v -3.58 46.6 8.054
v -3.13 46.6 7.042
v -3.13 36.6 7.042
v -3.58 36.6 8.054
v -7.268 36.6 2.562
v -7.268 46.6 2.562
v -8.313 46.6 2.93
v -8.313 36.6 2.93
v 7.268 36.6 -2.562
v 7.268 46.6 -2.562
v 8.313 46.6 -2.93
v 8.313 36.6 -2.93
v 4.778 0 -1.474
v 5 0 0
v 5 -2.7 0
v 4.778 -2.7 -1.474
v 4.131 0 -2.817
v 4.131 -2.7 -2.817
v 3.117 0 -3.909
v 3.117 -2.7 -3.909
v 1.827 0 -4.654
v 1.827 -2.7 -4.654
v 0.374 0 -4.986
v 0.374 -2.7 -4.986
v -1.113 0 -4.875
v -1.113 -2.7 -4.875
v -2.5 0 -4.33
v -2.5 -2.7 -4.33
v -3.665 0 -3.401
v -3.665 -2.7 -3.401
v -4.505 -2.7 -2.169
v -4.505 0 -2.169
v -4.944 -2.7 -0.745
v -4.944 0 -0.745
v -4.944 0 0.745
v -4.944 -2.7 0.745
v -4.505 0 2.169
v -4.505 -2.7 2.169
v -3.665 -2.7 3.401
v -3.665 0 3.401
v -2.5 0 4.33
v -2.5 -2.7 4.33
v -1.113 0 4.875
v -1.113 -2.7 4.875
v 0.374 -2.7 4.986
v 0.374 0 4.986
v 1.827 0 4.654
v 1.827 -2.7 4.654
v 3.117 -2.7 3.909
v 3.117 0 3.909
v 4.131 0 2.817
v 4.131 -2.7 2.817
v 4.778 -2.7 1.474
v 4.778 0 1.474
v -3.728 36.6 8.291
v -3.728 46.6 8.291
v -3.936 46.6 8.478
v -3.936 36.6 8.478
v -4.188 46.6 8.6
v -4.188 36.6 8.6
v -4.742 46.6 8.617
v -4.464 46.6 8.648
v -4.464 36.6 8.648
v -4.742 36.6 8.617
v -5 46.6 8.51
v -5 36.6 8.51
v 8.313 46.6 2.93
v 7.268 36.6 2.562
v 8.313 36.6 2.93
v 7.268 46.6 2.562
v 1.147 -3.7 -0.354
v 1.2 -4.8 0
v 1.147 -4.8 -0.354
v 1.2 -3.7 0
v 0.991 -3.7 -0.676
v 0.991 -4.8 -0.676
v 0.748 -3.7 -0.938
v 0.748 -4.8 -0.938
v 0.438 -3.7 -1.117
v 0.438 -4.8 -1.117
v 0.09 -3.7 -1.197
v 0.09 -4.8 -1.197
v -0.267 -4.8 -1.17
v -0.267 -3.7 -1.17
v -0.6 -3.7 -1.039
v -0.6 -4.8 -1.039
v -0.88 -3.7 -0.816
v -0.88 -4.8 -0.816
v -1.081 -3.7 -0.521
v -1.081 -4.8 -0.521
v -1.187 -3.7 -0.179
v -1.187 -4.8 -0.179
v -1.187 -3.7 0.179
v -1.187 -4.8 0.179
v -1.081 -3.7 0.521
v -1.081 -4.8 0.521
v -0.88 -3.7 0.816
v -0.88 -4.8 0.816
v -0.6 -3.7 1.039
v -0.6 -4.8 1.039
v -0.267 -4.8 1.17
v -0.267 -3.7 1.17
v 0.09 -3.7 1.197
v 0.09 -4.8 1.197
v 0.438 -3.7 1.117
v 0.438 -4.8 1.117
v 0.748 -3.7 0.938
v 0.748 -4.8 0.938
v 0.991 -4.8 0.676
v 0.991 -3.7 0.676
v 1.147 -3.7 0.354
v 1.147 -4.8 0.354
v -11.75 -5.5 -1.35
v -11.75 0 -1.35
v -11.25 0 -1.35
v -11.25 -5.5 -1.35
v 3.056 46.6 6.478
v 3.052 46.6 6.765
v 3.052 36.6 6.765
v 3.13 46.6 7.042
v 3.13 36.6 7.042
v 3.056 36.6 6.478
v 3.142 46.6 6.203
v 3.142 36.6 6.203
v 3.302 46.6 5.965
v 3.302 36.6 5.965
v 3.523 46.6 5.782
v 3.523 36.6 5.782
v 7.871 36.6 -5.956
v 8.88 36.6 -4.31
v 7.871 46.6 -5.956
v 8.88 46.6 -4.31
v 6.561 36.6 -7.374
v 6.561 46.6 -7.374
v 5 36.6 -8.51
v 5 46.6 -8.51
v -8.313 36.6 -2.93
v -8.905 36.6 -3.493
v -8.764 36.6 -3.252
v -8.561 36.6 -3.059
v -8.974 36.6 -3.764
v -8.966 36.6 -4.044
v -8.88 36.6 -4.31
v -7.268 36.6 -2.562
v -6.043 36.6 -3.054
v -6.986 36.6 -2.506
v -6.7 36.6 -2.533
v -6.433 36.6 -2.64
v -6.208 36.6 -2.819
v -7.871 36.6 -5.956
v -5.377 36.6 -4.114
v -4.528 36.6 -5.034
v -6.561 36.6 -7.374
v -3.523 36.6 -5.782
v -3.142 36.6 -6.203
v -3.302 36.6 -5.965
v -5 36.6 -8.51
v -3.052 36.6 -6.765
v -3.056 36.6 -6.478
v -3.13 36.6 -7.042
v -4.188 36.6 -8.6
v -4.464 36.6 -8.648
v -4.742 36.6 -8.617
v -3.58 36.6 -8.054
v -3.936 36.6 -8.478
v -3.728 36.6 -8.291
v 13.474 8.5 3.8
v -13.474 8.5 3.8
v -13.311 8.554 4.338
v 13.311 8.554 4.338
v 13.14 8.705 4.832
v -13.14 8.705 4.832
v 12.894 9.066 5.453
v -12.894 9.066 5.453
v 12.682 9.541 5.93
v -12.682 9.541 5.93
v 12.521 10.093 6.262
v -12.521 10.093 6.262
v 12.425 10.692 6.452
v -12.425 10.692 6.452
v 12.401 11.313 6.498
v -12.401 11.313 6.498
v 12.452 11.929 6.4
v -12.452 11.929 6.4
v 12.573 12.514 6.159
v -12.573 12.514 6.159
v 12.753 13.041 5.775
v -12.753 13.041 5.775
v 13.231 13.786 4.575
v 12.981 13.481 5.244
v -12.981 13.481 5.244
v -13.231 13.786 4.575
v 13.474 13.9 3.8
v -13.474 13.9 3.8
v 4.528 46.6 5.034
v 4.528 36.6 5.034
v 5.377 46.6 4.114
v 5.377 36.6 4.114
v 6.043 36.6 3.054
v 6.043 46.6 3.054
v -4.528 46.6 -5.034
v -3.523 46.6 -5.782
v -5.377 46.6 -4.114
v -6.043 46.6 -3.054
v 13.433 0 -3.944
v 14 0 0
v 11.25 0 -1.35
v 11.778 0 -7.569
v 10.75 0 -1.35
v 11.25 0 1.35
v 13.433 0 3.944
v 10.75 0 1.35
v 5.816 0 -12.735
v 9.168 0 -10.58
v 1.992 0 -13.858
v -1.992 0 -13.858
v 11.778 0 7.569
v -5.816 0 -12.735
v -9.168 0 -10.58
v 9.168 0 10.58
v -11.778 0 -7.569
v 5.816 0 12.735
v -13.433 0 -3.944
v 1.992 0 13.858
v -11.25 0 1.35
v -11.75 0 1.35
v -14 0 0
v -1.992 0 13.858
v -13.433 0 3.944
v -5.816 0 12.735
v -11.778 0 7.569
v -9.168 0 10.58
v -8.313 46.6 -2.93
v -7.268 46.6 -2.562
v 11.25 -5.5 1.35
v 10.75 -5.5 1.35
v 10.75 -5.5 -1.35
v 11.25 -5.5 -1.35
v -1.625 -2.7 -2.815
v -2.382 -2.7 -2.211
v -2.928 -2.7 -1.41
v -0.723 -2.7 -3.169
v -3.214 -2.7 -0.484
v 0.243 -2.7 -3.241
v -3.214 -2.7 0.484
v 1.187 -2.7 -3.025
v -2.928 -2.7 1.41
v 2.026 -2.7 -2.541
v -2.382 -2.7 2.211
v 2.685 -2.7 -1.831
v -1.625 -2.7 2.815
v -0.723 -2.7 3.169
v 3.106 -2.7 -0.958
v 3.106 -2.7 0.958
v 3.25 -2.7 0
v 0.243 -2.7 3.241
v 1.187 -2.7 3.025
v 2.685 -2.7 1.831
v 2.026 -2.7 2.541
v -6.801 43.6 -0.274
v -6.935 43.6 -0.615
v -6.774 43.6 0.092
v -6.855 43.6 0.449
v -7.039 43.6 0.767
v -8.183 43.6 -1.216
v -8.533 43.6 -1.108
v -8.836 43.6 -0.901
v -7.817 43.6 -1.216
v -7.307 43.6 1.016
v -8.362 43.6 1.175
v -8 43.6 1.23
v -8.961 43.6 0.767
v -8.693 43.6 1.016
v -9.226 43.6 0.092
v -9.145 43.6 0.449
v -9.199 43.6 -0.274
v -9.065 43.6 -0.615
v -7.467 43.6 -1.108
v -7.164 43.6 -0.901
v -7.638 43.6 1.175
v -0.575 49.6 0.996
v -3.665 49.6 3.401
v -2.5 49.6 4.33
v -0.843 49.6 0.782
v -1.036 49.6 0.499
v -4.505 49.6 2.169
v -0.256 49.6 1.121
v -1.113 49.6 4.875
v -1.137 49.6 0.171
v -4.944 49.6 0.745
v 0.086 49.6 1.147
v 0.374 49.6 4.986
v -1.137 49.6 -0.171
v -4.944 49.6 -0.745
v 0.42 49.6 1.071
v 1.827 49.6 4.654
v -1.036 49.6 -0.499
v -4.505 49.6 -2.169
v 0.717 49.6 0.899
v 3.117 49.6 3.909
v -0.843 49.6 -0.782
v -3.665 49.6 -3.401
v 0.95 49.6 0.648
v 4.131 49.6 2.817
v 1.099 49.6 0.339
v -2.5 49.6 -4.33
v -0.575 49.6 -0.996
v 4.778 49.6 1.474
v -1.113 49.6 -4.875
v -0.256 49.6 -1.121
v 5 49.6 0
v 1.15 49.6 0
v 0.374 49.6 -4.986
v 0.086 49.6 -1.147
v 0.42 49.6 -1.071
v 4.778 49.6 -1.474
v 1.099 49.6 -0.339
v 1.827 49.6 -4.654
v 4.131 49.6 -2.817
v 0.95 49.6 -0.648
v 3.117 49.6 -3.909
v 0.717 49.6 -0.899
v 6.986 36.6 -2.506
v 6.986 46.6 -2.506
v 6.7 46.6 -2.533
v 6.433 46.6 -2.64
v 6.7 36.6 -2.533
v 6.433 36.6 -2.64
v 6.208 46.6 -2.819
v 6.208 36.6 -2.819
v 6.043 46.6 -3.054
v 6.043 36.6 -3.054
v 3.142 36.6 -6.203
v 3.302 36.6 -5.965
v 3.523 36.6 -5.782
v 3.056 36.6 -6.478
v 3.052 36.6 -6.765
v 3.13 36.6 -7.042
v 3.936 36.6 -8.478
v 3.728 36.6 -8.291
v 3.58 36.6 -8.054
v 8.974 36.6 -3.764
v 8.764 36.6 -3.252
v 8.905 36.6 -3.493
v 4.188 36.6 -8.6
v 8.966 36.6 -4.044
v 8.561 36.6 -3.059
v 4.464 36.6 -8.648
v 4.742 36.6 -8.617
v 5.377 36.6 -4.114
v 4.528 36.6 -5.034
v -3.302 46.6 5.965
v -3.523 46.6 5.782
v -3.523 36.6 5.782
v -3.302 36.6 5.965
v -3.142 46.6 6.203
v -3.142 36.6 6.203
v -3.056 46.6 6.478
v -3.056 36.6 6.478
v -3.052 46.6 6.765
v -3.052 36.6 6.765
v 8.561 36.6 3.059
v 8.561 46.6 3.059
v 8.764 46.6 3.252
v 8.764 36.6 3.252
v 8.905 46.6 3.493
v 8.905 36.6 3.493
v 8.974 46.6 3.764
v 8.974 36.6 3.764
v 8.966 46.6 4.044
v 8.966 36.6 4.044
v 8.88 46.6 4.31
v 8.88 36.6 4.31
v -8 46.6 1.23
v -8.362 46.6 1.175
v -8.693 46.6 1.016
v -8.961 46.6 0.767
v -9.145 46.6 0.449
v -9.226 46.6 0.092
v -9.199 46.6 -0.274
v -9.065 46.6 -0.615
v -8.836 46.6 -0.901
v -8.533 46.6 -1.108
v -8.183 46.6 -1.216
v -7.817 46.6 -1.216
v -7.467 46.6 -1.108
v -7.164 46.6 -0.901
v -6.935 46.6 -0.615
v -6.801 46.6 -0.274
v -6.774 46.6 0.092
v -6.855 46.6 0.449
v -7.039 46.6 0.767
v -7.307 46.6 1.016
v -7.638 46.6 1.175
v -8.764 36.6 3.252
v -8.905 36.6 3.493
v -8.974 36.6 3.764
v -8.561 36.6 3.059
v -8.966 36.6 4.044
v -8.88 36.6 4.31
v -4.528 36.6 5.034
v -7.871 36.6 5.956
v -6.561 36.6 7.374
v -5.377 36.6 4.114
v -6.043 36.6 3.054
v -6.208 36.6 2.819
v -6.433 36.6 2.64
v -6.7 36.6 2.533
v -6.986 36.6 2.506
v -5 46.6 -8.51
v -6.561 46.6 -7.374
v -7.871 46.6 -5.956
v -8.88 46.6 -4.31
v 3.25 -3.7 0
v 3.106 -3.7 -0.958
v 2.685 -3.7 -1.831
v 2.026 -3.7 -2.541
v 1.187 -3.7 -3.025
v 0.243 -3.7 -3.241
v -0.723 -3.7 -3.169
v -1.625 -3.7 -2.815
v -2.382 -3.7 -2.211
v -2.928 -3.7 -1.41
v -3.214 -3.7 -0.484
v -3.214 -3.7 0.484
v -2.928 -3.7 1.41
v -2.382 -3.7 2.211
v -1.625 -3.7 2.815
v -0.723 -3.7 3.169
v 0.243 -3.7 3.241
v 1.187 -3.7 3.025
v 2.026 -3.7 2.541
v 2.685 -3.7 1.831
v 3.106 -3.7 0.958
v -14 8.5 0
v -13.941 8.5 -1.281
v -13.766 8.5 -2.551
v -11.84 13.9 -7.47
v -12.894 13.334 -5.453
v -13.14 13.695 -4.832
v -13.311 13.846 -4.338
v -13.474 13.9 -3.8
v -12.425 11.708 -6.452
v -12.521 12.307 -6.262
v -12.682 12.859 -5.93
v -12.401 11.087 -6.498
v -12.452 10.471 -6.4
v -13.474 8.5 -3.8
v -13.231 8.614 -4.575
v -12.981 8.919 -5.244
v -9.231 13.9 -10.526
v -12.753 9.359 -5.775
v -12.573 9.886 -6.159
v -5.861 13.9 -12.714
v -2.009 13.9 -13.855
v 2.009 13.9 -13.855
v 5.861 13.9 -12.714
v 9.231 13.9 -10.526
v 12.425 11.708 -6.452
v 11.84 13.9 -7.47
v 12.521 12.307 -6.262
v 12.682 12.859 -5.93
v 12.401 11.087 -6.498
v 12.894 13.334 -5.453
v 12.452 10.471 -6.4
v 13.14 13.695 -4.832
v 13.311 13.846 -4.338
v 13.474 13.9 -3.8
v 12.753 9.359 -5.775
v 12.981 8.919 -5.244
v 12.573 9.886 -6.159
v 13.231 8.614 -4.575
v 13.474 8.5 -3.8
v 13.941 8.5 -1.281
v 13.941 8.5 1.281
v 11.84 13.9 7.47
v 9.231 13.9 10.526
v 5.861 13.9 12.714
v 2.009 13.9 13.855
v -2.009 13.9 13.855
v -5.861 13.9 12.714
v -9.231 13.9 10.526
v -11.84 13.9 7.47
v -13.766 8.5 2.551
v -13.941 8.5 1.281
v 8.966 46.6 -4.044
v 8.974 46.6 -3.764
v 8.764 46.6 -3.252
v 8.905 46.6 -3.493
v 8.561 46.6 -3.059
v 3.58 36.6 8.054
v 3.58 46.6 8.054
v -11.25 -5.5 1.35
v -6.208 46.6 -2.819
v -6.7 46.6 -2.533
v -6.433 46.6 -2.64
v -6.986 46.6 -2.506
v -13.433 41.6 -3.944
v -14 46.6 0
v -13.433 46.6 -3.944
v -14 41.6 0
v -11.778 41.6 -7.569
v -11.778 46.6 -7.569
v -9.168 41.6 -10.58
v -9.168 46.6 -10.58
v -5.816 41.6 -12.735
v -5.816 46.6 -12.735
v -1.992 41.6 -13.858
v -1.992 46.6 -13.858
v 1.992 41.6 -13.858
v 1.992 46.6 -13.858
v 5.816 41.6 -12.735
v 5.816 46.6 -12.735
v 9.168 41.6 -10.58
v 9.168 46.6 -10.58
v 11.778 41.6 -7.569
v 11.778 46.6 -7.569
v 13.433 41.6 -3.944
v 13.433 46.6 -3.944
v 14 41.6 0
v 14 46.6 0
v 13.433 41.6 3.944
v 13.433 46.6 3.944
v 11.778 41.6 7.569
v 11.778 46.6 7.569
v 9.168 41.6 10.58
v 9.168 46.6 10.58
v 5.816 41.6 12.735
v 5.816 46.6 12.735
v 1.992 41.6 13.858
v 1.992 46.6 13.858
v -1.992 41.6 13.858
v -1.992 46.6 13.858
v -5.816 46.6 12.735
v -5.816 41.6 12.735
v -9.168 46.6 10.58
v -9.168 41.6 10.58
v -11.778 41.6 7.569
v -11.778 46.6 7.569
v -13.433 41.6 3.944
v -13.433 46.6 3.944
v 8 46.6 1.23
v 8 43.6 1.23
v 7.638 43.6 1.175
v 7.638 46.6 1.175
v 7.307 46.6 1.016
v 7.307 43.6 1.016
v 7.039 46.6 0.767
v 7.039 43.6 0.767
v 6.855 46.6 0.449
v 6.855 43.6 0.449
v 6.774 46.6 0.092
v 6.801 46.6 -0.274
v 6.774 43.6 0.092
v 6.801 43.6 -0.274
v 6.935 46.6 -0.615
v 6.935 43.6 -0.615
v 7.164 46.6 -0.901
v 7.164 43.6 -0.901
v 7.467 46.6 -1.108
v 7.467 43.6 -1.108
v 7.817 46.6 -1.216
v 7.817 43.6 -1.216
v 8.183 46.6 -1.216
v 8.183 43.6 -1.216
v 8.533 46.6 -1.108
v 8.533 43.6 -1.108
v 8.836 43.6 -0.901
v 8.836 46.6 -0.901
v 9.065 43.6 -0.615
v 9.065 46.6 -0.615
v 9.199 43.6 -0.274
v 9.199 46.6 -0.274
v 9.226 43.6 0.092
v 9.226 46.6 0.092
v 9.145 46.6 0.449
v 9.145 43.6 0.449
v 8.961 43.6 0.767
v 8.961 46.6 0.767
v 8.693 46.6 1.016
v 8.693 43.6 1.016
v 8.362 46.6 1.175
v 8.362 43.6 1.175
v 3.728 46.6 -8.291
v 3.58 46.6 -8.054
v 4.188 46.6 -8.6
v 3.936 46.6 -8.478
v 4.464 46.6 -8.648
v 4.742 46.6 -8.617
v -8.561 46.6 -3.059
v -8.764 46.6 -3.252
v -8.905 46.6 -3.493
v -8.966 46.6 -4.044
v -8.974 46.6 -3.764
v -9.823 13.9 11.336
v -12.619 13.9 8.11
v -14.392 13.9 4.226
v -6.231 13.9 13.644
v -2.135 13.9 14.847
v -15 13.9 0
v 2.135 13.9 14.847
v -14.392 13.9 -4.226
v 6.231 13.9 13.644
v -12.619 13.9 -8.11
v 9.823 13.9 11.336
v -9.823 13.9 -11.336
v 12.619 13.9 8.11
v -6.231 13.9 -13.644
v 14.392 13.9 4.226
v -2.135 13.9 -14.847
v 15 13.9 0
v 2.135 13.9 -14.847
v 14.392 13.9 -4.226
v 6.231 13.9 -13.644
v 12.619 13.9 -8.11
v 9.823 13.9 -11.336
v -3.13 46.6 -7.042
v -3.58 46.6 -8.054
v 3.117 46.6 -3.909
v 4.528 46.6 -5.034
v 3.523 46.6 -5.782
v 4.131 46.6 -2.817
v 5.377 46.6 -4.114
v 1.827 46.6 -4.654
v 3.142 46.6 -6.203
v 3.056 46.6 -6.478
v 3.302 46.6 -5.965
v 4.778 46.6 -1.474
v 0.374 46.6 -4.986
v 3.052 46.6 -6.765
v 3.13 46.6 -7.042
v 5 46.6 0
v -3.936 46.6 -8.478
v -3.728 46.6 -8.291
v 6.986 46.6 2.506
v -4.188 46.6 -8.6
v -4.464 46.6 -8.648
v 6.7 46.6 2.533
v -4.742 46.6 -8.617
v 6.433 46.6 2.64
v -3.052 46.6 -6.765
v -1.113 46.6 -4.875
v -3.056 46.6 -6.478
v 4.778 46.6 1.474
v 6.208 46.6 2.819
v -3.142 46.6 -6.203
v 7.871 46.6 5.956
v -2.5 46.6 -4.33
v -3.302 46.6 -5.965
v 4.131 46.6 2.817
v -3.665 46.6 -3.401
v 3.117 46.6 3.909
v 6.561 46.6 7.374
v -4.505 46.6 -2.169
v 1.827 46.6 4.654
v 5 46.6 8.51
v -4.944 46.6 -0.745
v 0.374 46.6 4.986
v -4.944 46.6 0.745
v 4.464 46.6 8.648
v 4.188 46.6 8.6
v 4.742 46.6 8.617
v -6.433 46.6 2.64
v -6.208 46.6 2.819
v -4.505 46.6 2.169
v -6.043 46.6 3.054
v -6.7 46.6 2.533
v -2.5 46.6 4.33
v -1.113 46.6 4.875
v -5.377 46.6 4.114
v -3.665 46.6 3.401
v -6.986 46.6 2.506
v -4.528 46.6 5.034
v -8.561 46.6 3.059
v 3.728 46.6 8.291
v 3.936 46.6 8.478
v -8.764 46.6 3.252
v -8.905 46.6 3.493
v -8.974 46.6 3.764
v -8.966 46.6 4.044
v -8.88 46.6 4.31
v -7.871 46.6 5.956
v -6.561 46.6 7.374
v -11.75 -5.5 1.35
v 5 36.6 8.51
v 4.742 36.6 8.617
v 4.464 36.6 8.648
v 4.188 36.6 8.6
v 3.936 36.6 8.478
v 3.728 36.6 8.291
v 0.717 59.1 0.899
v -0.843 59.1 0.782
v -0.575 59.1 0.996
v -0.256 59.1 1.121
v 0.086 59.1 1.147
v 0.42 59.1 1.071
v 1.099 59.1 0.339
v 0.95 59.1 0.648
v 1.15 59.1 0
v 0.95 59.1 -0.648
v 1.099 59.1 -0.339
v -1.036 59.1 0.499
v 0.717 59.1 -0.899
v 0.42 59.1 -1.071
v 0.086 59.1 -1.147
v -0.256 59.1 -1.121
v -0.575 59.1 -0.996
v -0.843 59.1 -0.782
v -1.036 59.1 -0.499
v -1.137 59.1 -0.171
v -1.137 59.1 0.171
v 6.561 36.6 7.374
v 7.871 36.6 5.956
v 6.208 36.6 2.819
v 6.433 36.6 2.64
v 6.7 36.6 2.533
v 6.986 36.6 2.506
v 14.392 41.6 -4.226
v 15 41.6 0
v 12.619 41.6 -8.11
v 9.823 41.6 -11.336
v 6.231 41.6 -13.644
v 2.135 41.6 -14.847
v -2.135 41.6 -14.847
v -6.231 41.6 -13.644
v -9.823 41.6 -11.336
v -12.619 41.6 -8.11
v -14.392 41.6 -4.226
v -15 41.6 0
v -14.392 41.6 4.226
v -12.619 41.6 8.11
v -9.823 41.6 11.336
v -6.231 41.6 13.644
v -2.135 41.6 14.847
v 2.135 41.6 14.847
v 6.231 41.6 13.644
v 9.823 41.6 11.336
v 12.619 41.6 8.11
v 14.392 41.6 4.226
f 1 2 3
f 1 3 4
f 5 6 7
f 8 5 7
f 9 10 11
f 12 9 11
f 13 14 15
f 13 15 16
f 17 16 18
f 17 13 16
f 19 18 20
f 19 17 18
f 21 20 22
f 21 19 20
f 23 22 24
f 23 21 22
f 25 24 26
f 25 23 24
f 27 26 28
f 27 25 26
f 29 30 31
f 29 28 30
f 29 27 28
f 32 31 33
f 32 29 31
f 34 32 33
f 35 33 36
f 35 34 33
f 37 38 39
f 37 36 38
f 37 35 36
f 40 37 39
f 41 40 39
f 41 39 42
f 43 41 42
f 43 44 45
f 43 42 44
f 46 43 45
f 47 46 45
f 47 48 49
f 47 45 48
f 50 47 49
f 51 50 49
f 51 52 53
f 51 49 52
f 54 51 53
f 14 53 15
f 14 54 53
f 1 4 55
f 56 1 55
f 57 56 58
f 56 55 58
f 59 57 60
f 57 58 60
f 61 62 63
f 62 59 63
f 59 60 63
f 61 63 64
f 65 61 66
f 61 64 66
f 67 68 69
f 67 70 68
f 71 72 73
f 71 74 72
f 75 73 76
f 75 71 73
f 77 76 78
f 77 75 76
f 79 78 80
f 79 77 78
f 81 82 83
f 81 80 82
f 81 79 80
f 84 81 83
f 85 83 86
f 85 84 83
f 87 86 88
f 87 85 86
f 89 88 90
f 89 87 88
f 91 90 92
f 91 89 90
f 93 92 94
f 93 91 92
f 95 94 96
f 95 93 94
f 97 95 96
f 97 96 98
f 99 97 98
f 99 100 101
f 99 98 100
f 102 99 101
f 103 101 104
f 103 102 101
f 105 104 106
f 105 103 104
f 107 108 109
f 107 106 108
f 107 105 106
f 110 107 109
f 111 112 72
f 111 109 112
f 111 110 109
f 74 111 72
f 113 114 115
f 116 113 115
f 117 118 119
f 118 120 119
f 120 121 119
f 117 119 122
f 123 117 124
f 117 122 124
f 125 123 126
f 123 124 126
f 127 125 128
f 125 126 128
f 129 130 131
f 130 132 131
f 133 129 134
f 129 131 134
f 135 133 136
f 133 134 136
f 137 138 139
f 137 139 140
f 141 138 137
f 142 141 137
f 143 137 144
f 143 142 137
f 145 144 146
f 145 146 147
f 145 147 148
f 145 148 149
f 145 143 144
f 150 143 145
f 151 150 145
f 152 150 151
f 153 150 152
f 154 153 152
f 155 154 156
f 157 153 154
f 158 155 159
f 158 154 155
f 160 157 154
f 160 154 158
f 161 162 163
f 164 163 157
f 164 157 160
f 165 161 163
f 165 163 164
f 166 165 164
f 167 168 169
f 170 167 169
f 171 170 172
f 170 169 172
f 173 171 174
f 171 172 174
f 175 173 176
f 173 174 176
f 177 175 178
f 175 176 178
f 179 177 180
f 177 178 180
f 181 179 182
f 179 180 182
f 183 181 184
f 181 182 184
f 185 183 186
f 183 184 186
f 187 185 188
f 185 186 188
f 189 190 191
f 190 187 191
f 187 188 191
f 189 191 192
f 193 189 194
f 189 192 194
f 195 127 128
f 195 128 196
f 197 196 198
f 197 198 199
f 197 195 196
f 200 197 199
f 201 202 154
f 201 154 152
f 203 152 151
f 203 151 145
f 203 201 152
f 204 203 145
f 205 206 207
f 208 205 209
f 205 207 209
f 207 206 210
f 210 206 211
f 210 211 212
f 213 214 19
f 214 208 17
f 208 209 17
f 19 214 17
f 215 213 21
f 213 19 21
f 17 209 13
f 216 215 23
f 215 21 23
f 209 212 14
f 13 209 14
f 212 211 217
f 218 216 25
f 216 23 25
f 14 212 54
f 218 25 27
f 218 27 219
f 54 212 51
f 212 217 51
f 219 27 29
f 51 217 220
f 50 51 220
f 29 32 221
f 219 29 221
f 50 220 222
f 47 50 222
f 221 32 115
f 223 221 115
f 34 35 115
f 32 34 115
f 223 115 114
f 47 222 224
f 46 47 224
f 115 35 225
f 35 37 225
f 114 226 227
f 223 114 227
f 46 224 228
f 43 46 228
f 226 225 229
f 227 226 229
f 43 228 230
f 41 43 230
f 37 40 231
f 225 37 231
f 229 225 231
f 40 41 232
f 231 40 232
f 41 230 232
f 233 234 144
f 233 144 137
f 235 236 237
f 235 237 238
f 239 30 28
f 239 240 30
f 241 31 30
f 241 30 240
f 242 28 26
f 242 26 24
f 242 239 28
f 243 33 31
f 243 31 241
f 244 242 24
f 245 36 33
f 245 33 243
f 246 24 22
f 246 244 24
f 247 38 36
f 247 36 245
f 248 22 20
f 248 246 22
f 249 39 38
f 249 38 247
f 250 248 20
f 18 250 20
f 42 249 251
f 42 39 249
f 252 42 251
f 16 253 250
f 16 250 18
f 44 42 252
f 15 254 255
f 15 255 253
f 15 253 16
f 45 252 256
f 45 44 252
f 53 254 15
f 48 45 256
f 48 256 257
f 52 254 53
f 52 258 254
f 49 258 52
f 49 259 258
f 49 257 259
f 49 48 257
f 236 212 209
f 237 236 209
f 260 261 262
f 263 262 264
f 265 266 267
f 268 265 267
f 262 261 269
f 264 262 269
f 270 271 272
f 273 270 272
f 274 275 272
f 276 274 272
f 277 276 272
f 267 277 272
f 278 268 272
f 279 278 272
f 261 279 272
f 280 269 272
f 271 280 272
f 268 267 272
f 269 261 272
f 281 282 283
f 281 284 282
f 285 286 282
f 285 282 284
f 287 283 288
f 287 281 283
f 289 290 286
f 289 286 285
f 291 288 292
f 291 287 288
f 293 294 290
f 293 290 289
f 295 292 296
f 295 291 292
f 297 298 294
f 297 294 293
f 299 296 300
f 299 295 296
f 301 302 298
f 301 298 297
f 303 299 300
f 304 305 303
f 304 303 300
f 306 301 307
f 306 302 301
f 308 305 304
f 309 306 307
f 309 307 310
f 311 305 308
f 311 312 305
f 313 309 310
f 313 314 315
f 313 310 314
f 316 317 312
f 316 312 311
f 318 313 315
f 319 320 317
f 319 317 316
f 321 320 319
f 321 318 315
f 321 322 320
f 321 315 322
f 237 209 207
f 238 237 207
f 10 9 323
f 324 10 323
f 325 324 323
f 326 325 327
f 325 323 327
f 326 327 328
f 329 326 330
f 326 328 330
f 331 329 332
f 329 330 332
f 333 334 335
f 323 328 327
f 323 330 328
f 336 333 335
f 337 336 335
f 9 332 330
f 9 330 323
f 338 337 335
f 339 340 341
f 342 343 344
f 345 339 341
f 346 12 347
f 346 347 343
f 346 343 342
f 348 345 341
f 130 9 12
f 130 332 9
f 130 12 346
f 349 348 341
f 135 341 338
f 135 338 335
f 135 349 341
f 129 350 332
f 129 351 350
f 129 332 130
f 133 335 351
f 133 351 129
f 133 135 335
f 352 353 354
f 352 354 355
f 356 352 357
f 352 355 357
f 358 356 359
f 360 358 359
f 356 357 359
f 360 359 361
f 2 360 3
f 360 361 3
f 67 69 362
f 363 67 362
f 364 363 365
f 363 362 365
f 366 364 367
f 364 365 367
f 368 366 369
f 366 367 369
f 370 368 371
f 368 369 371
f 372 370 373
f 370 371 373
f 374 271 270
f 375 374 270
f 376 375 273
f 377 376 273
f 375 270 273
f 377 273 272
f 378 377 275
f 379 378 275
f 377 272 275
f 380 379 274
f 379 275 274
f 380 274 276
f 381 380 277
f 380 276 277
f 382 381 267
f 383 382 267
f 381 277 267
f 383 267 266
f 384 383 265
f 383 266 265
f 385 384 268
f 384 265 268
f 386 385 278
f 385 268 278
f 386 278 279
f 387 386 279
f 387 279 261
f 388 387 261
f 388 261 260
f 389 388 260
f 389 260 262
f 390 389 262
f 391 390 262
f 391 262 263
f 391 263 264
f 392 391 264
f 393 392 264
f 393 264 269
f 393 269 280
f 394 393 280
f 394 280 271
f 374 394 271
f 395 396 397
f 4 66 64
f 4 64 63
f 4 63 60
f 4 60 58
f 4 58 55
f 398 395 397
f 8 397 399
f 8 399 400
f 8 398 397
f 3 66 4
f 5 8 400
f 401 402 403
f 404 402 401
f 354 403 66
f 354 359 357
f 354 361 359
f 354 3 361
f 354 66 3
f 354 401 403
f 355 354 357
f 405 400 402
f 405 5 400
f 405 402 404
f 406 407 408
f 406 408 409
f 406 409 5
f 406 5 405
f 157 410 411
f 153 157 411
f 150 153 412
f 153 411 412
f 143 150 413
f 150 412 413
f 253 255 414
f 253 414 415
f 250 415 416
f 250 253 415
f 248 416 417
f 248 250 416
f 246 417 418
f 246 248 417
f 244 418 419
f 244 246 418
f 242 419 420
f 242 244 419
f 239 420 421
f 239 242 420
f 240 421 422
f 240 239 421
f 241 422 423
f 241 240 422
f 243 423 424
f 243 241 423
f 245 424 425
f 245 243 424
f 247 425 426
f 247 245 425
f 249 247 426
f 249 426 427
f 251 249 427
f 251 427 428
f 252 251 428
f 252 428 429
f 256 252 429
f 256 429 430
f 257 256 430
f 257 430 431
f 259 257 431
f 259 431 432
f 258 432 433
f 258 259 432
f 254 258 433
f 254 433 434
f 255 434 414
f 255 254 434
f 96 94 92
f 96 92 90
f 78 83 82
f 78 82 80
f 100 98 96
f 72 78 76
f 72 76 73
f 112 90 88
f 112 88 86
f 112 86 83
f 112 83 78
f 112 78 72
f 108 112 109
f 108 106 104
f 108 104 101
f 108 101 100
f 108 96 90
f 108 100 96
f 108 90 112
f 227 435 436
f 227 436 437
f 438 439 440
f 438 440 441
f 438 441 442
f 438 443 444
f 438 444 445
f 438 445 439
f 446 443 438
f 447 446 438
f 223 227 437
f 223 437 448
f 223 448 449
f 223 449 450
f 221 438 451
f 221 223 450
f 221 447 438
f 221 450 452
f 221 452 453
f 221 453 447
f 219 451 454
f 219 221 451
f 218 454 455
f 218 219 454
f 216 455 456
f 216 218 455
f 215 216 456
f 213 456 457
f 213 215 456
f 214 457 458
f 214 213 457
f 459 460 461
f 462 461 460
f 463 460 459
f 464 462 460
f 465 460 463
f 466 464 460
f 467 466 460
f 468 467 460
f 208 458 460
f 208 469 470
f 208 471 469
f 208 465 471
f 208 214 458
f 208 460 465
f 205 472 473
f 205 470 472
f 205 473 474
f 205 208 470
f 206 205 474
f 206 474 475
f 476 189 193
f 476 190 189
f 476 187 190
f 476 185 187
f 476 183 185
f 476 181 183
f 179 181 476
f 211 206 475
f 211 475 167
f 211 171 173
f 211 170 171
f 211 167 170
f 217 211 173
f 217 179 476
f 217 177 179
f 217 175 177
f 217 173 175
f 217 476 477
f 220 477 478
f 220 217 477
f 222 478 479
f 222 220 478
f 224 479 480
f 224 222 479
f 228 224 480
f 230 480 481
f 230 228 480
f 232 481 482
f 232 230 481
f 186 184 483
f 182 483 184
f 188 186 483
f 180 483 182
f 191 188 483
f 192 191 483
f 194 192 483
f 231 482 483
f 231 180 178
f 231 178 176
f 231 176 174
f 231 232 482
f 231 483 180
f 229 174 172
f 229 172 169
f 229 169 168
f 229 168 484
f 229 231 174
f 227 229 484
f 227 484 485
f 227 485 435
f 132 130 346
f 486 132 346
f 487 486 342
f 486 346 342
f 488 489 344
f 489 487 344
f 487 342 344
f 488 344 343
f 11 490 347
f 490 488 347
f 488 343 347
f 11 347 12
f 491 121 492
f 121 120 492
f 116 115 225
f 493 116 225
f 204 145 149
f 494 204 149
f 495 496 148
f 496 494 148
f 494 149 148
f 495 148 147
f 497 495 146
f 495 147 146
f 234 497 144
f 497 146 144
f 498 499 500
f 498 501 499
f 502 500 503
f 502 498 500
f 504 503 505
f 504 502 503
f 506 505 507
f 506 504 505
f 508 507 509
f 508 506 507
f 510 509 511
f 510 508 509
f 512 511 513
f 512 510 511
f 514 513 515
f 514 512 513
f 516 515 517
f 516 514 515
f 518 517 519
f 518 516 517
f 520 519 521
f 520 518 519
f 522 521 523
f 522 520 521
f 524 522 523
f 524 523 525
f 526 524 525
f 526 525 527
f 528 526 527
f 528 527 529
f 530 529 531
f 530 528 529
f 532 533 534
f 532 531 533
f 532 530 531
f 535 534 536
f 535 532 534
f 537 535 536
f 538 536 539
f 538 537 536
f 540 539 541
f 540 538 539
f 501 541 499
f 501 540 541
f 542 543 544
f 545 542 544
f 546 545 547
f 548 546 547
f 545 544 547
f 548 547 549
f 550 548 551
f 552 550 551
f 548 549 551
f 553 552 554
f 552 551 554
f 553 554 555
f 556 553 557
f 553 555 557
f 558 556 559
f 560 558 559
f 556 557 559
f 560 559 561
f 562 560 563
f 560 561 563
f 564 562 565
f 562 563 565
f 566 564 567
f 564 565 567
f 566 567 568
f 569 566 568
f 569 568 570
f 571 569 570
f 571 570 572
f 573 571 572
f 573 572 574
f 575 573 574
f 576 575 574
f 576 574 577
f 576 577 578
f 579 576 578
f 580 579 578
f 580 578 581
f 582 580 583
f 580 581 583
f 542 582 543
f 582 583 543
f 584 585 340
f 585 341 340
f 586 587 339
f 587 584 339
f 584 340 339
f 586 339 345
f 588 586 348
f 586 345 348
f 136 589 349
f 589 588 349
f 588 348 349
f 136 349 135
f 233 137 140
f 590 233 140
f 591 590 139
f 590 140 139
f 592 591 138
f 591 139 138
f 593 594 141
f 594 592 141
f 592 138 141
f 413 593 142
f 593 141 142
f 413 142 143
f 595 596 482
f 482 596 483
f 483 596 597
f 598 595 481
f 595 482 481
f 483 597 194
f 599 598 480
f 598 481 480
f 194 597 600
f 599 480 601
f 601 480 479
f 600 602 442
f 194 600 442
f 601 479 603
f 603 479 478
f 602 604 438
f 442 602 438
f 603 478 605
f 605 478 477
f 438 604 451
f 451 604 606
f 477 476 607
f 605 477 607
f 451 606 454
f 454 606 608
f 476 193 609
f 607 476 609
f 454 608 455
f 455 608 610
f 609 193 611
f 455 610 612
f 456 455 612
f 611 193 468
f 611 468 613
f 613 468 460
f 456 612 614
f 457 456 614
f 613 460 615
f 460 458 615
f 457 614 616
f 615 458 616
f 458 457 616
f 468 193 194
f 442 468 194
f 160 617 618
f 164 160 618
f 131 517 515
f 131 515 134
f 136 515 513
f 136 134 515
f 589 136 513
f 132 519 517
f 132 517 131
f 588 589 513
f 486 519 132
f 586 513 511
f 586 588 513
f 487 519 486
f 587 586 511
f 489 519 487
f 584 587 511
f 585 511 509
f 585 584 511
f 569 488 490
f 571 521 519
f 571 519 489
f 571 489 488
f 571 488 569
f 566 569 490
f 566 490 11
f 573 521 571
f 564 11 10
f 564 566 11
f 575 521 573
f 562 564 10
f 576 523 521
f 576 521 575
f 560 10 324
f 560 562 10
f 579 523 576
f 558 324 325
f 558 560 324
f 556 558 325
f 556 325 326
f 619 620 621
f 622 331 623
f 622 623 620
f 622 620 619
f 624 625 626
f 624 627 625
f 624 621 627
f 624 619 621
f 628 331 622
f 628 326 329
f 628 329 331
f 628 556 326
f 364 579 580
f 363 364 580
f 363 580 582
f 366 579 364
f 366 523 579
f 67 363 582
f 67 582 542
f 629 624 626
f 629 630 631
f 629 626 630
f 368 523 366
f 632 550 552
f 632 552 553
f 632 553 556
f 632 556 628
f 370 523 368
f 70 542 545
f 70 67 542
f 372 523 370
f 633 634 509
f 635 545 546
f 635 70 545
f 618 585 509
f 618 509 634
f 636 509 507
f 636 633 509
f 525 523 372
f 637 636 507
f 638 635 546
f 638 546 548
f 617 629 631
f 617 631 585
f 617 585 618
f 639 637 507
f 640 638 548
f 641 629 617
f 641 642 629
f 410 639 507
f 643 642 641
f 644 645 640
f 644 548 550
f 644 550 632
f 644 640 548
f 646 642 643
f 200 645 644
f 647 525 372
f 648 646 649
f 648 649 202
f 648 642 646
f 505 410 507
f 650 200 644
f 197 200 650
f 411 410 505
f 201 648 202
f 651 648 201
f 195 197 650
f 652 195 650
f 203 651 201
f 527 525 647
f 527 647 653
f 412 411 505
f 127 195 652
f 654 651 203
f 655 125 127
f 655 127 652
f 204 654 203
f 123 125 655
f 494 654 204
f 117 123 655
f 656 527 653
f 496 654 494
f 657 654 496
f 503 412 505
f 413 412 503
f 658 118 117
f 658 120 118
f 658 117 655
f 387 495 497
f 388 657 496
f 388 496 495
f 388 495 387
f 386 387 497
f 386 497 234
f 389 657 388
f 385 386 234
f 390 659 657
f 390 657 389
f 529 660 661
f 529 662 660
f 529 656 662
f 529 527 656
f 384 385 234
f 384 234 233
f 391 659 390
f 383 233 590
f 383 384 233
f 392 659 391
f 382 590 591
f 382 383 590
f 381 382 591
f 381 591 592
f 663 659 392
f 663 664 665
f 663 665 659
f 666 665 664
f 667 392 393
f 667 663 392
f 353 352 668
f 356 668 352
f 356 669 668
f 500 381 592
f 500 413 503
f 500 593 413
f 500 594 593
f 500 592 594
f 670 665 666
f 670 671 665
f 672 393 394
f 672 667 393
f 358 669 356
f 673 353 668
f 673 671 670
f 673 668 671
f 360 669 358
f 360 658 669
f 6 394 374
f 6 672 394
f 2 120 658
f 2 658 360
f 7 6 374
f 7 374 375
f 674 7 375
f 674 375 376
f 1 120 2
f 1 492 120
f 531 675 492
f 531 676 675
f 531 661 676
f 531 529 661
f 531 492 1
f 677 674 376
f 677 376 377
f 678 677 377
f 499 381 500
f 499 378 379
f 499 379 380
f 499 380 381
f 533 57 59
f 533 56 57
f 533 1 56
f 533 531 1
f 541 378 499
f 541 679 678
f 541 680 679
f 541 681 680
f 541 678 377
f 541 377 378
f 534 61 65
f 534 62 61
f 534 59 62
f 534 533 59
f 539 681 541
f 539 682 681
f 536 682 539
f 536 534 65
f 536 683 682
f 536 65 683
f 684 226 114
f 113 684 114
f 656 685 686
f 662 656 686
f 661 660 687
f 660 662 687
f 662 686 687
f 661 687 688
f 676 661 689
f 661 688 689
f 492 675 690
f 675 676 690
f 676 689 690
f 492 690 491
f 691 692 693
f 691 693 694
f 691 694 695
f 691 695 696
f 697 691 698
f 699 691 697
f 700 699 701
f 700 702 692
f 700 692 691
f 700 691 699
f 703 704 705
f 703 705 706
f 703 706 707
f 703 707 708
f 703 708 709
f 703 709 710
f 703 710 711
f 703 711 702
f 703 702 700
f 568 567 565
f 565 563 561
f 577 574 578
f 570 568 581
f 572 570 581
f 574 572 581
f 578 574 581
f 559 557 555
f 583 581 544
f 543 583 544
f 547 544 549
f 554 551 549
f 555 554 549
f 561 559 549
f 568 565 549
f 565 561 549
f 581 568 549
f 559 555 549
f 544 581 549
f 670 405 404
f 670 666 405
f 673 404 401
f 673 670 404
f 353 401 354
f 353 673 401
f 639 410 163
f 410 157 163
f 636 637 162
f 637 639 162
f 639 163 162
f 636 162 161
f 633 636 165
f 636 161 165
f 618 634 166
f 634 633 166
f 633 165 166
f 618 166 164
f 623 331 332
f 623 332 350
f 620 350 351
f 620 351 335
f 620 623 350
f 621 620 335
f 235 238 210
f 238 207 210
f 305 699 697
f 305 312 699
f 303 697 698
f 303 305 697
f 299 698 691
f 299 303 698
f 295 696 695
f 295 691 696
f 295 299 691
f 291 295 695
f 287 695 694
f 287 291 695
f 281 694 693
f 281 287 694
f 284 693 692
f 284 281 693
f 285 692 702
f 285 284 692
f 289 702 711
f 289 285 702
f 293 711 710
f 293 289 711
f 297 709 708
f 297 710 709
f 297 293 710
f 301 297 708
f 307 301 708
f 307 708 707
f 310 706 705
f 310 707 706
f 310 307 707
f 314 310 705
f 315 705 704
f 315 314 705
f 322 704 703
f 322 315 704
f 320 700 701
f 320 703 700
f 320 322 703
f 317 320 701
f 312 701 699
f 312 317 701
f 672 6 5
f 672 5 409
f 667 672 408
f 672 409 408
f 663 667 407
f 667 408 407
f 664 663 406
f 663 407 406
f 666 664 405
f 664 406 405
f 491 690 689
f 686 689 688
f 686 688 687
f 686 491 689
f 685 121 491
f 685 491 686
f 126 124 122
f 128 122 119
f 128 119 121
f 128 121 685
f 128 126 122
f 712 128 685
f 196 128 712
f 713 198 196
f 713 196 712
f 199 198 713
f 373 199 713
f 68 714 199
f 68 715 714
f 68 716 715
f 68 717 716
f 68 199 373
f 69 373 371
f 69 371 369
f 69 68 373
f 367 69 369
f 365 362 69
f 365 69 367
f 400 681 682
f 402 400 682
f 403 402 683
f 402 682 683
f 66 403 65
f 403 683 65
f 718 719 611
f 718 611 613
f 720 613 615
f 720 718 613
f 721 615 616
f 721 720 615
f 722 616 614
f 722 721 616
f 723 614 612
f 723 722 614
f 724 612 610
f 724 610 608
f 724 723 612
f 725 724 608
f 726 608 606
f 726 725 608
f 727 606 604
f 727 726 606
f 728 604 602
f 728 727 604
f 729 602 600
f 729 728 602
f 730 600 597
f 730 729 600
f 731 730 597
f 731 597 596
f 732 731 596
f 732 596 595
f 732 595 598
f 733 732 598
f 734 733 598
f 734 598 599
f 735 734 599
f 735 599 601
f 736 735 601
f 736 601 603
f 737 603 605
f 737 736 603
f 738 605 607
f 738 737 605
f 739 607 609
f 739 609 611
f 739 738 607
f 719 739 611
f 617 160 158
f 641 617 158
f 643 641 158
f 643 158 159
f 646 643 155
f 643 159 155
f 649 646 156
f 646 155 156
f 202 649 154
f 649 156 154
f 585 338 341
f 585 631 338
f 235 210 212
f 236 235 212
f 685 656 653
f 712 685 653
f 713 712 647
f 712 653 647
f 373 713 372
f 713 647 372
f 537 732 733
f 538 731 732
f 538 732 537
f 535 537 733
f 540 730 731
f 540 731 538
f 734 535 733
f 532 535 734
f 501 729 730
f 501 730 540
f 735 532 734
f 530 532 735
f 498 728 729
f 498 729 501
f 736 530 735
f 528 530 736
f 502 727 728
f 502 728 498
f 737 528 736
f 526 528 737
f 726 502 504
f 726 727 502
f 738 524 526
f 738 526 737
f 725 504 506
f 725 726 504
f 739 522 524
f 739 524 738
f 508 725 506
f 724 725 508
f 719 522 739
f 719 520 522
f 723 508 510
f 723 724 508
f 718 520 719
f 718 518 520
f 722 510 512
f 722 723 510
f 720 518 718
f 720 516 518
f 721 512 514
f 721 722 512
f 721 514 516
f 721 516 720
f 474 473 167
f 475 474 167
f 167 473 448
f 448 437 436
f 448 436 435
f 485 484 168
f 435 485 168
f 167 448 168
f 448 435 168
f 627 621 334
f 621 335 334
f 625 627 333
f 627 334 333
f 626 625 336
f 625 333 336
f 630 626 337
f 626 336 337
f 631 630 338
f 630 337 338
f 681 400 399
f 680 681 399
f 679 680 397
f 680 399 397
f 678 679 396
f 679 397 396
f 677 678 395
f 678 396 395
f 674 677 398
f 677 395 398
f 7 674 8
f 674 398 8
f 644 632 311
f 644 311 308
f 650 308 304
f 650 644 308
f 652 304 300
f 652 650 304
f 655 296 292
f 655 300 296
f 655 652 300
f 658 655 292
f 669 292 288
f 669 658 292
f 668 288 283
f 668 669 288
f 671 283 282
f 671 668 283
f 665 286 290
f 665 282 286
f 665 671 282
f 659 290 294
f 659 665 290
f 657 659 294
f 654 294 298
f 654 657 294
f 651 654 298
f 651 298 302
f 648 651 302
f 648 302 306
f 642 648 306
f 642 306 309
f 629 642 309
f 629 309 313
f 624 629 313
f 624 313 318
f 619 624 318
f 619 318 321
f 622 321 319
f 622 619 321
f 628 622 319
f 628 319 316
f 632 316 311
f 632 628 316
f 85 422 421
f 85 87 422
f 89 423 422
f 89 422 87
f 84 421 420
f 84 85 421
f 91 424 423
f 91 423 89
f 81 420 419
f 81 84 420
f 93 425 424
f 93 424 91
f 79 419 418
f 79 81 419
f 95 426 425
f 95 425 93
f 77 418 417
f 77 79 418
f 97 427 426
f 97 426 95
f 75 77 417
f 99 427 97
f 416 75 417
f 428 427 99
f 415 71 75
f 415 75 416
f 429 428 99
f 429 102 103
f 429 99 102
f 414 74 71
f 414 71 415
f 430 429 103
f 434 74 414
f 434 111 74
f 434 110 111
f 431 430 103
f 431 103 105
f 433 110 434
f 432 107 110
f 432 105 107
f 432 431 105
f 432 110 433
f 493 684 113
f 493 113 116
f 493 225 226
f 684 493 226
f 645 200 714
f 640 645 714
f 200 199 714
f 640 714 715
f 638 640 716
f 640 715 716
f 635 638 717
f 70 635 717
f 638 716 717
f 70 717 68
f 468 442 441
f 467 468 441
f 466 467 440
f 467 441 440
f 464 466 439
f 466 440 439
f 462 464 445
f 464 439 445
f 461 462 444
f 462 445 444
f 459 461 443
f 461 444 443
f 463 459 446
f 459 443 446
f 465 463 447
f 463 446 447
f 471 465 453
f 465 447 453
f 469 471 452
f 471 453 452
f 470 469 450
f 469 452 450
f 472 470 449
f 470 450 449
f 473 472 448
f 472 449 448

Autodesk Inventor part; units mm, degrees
ref_plane "YZ Plane" through (0, 0, 0) normal (1, 0, 0) x (0, 1, 0)
sketch "Sketch1" plane through (0, 0, 0) normal (0, 1, 0) x (-1, 0, 0)
  circle A0 centre (0, 0) radius 14
  dimension "d0" = 28
extrude "Extrusion1" add sketch "Sketch1" along normal blind 46.6
sketch "Sketch2" plane through (0, 46.6, 0) normal (0, 1, 0) x (1, 0, 0)
  circle A0 centre (0, 0) radius 14 projected
  circle A1 centre (0, 0) radius 5
  dimension "d3" = 10
extrude "Extrusion2" add sketch "Sketch2" along normal blind 3 contours A1
sketch "Sketch3" plane through (0, 46.6, 0) normal (0, 1, 0) x (1, 0, 0)
  circle A0 centre (0, 0) radius 5 projected
  circle A1 centre (0, 0) radius 5 projected
  circle A2 centre (0, 0) radius 14 projected
  circle A3 centre (0, 0) radius 14 projected
  line L0 (-14, 0) -> (14, 0)
  point P0 (-8, 0)
  point P1 (8, 0)
  dimension "d6" = 16
  dimension "d7" = 6
  dimension "d8" = 6
hole "Hole1" at (-8, 46.6, 0) at (8, 46.6, 0) direction (0, -1, 0) diameter 2.459 depth 3 thread size "M3x0.5" class "6H" standard "ISO Metric profile"
ref_plane "Work Plane1" through (0, 41.6, 0) normal (0, 1, 0) x (1, 0, 0)
sketch "Sketch4" plane through (0, 41.6, 0) normal (0, 1, 0) x (1, 0, 0)
  circle A0 centre (0, 0) radius 15
  dimension "d17" = 30
extrude "Extrusion3" add sketch "Sketch4" against normal blind 27.7
sketch "Sketch5" plane through (0, 0, 0) normal (0, -1, 0) x (1, 0, 0)
  circle A0 centre (0, 0) radius 5
  dimension "d20" = 10
extrude "Extrusion4" add sketch "Sketch5" along normal blind 2.7
sketch "Sketch6" plane through (0, 0, 0) normal (0, -1, 0) x (1, 0, 0)
  circle A0 centre (0, 0) radius 5 projected
  circle A1 centre (0, 0) radius 5 projected
  circle A2 centre (0, 0) radius 14 projected
  circle A3 centre (0, 0) radius 14 projected
  line L0 (14, 0) -> (-14, 0)
  line L1 (-11.25, 1.35) -> (-11.75, 1.35)
  line L2 (-11.75, 1.35) -> (-11.75, -1.35)
  line L3 (-11.75, -1.35) -> (-11.25, -1.35)
  line L4 (-11.25, -1.35) -> (-11.25, 1.35)
  line L5 (11.25, 1.35) -> (10.75, 1.35)
  line L6 (10.75, 1.35) -> (10.75, -1.35)
  line L7 (10.75, -1.35) -> (11.25, -1.35)
  line L8 (11.25, -1.35) -> (11.25, 1.35)
  dimension "d23" = 22
  dimension "d24" = 0.5
  dimension "d25" = 0.5
  dimension "d26" = 11.25
  dimension "d27" = 11.25
  dimension "d28" = 2.7
  dimension "d29" = 2.7
  dimension "d30" = 1.35
  dimension "d31" = 1.35
extrude "Extrusion5" add sketch "Sketch6" along normal blind 5.5 contours L6 L5 L8 L0 | L0 L8 L7 L6 | L4 L3 L2 L0 | L0 L2 L1 L4
sketch "Sketch7" plane through (0, 49.6, 0) normal (0, 1, 0) x (1, 0, 0)
  circle A0 centre (0, 0) radius 1.15
  dimension "d34" = 2.3
extrude "Extrusion6" add sketch "Sketch7" along normal blind 9.5
ref_plane "Work Plane2" through (0, 50.6, 0) normal (0, 1, 0) x (1, 0, 0)
sketch "Sketch10" plane through (0, 0, 0) normal (1, 0, 0) x (0, 1, 0)
  line L0 (0, -14) -> (0, 14) projected
  line L1 (13.9, 14) -> (13.9, -14) projected
  line L2 (8.5, 3.8) -> (13.9, 3.8)
  line L3 (13.9, 3.8) -> (13.9, -3.8)
  line L4 (13.9, -3.8) -> (8.5, -3.8)
  line L5 (8.5, -3.8) -> (8.5, 3.8)
  circle A0 centre (11.2, 3.8) radius 2.7
  circle A1 centre (11.2, -3.8) radius 2.7
  line L6 (0, 0) -> (13.9, 0)
  line L7 (13.9, 14) -> (13.9, -14) projected
  line L8 (0, -14) -> (13.9, -14) projected
  point P0 (11.2, -6.5)
  point P1 (11.2, 6.5)
  dimension "d57" = 8.5
  dimension "d59" = 0
  dimension "d60" = 5.4
  dimension "d61" = 13.9
  dimension "d65" = 3.8
  dimension "d66" = 3.8
  dimension "d80" = 5.4
  dimension "d81" = 5.4
  dimension "d82" = 2.7
  dimension "d83" = 2.7
  dimension "d84" = 13
extrude "Extrusion9" cut sketch "Sketch10" along normal mid plane 31.5 contours L6 L1 A1 L5 | L5 A0 L1 L6 | A1 L4 | L4 A1 | A0 L2 | L2 A0
sketch "Sketch12" plane through (0, 46.6, 0) normal (0, 1, 0) x (1, 0, 0)
  circle A0 centre (0, 0) radius 1.15 projected
  circle A1 centre (0, 0) radius 5 projected
  circle A2 centre (-8, 0) radius 1.2295 projected
  circle A3 centre (8, 0) radius 1.2295 projected
  circle A4 centre (0, 0) radius 5 projected
  circle A5 centre (0, 0) radius 14 projected
  circle A6 centre (0, 0) radius 14 projected
  line L0 (-14, 0) -> (14, 0)
  line L1 (0, 14) -> (0, -14)
  circle A7 centre (0, 0) radius 6.7705
  circle A8 centre (0, 0) radius 9.8705
  line L2 (-2.75, 6.1869) -> (-4.0091, 9.0196)
  line L3 (-6.3854, 2.2508) -> (-9.3091, 3.2814)
  line L4 (2.75, 6.1869) -> (4.0091, 9.0196)
  line L5 (6.3854, 2.2508) -> (9.3091, 3.2814)
  circle A9 centre (-8, 0) radius 1.2295 projected
  circle A10 centre (8, 0) radius 1.2295 projected
  line L6 (-2.75, -6.1869) -> (-4.0091, -9.0196)
  line L7 (-6.3854, -2.2508) -> (-9.3091, -3.2814)
  line L8 (2.75, -6.1869) -> (4.0091, -9.0196)
  line L9 (6.3854, -2.2508) -> (9.3091, -3.2814)
  point P0 (0, 6.7705)
  point P1 (0, 9.8705)
  point P2 (-8, 1.2295)
  point P3 (8, 1.2295)
  point P4 (-6.3854, -2.2508)
  point P5 (6.3854, -2.2508)
  dimension "d85" = 3.1
  dimension "d86" = 5.5
  dimension "d87" = 4.0091
  dimension "d88" = 4.0091
  dimension "d89" = 1.5
  dimension "d90" = 1.5
  dimension "d91" = 1.2295
  dimension "d92" = 2.459
  dimension "d93" = 2.459
  dimension "d94" = 1.2295
extrude "Extrusion11" cut sketch "Sketch12" against normal blind 10 contours A7 L4 A8 L5 | L9 A8 L8 A7 | A7 L3 A8 L2 | L6 A8 L7 A7
fillet "Fillet1" radius 1 16 edges at (-4.0091, 41.6, -9.0196) (-2.75, 41.6, -6.1869) (-6.3854, 41.6, -2.2508) (-9.3091, 41.6, -3.2814) (9.3091, 41.6, -3.2814) (6.3854, 41.6, -2.2508) (4.0091, 41.6, -9.0196) (9.3091, 41.6, 3.2814) (6.3854, 41.6, 2.2508) (4.0091, 41.6, 9.0196) (2.75, 41.6, 6.1869) (-4.0091, 41.6, 9.0196) (-9.3091, 41.6, 3.2814) (-6.3854, 41.6, 2.2508) (-2.75, 41.6, 6.1869) (2.75, 41.6, -6.1869)
sketch "Sketch13" plane through (0, -2.7, 0) normal (0, -1, 0) x (1, 0, 0)
  circle A0 centre (0, 0) radius 3.25
  dimension "d98" = 6.5
extrude "Extrusion12" add sketch "Sketch13" along normal blind 1
sketch "Sketch14" plane through (0, -3.7, 0) normal (0, -1, 0) x (1, 0, 0)
  circle A0 centre (0, 0) radius 1.2
  dimension "d101" = 2.4
extrude "Extrusion13" add sketch "Sketch14" along normal blind 1.1
equation "\"d7\" = d8"
equation "\"d26\" = d27"
equation "\"d30\" = d31"
equation "\"d65\" = d66"
equation "\"d82\" = 0.5 * d80"
equation "\"d83\" = 0.5 * d81"
equation "\"d87\" = d88"
equation "\"d91\" = 0.5 * d92"
equation "\"d94\" = 0.5 * d93"
equation "\"d41\" = d42"
properties part number "rs390" material "Steel, Mild"
